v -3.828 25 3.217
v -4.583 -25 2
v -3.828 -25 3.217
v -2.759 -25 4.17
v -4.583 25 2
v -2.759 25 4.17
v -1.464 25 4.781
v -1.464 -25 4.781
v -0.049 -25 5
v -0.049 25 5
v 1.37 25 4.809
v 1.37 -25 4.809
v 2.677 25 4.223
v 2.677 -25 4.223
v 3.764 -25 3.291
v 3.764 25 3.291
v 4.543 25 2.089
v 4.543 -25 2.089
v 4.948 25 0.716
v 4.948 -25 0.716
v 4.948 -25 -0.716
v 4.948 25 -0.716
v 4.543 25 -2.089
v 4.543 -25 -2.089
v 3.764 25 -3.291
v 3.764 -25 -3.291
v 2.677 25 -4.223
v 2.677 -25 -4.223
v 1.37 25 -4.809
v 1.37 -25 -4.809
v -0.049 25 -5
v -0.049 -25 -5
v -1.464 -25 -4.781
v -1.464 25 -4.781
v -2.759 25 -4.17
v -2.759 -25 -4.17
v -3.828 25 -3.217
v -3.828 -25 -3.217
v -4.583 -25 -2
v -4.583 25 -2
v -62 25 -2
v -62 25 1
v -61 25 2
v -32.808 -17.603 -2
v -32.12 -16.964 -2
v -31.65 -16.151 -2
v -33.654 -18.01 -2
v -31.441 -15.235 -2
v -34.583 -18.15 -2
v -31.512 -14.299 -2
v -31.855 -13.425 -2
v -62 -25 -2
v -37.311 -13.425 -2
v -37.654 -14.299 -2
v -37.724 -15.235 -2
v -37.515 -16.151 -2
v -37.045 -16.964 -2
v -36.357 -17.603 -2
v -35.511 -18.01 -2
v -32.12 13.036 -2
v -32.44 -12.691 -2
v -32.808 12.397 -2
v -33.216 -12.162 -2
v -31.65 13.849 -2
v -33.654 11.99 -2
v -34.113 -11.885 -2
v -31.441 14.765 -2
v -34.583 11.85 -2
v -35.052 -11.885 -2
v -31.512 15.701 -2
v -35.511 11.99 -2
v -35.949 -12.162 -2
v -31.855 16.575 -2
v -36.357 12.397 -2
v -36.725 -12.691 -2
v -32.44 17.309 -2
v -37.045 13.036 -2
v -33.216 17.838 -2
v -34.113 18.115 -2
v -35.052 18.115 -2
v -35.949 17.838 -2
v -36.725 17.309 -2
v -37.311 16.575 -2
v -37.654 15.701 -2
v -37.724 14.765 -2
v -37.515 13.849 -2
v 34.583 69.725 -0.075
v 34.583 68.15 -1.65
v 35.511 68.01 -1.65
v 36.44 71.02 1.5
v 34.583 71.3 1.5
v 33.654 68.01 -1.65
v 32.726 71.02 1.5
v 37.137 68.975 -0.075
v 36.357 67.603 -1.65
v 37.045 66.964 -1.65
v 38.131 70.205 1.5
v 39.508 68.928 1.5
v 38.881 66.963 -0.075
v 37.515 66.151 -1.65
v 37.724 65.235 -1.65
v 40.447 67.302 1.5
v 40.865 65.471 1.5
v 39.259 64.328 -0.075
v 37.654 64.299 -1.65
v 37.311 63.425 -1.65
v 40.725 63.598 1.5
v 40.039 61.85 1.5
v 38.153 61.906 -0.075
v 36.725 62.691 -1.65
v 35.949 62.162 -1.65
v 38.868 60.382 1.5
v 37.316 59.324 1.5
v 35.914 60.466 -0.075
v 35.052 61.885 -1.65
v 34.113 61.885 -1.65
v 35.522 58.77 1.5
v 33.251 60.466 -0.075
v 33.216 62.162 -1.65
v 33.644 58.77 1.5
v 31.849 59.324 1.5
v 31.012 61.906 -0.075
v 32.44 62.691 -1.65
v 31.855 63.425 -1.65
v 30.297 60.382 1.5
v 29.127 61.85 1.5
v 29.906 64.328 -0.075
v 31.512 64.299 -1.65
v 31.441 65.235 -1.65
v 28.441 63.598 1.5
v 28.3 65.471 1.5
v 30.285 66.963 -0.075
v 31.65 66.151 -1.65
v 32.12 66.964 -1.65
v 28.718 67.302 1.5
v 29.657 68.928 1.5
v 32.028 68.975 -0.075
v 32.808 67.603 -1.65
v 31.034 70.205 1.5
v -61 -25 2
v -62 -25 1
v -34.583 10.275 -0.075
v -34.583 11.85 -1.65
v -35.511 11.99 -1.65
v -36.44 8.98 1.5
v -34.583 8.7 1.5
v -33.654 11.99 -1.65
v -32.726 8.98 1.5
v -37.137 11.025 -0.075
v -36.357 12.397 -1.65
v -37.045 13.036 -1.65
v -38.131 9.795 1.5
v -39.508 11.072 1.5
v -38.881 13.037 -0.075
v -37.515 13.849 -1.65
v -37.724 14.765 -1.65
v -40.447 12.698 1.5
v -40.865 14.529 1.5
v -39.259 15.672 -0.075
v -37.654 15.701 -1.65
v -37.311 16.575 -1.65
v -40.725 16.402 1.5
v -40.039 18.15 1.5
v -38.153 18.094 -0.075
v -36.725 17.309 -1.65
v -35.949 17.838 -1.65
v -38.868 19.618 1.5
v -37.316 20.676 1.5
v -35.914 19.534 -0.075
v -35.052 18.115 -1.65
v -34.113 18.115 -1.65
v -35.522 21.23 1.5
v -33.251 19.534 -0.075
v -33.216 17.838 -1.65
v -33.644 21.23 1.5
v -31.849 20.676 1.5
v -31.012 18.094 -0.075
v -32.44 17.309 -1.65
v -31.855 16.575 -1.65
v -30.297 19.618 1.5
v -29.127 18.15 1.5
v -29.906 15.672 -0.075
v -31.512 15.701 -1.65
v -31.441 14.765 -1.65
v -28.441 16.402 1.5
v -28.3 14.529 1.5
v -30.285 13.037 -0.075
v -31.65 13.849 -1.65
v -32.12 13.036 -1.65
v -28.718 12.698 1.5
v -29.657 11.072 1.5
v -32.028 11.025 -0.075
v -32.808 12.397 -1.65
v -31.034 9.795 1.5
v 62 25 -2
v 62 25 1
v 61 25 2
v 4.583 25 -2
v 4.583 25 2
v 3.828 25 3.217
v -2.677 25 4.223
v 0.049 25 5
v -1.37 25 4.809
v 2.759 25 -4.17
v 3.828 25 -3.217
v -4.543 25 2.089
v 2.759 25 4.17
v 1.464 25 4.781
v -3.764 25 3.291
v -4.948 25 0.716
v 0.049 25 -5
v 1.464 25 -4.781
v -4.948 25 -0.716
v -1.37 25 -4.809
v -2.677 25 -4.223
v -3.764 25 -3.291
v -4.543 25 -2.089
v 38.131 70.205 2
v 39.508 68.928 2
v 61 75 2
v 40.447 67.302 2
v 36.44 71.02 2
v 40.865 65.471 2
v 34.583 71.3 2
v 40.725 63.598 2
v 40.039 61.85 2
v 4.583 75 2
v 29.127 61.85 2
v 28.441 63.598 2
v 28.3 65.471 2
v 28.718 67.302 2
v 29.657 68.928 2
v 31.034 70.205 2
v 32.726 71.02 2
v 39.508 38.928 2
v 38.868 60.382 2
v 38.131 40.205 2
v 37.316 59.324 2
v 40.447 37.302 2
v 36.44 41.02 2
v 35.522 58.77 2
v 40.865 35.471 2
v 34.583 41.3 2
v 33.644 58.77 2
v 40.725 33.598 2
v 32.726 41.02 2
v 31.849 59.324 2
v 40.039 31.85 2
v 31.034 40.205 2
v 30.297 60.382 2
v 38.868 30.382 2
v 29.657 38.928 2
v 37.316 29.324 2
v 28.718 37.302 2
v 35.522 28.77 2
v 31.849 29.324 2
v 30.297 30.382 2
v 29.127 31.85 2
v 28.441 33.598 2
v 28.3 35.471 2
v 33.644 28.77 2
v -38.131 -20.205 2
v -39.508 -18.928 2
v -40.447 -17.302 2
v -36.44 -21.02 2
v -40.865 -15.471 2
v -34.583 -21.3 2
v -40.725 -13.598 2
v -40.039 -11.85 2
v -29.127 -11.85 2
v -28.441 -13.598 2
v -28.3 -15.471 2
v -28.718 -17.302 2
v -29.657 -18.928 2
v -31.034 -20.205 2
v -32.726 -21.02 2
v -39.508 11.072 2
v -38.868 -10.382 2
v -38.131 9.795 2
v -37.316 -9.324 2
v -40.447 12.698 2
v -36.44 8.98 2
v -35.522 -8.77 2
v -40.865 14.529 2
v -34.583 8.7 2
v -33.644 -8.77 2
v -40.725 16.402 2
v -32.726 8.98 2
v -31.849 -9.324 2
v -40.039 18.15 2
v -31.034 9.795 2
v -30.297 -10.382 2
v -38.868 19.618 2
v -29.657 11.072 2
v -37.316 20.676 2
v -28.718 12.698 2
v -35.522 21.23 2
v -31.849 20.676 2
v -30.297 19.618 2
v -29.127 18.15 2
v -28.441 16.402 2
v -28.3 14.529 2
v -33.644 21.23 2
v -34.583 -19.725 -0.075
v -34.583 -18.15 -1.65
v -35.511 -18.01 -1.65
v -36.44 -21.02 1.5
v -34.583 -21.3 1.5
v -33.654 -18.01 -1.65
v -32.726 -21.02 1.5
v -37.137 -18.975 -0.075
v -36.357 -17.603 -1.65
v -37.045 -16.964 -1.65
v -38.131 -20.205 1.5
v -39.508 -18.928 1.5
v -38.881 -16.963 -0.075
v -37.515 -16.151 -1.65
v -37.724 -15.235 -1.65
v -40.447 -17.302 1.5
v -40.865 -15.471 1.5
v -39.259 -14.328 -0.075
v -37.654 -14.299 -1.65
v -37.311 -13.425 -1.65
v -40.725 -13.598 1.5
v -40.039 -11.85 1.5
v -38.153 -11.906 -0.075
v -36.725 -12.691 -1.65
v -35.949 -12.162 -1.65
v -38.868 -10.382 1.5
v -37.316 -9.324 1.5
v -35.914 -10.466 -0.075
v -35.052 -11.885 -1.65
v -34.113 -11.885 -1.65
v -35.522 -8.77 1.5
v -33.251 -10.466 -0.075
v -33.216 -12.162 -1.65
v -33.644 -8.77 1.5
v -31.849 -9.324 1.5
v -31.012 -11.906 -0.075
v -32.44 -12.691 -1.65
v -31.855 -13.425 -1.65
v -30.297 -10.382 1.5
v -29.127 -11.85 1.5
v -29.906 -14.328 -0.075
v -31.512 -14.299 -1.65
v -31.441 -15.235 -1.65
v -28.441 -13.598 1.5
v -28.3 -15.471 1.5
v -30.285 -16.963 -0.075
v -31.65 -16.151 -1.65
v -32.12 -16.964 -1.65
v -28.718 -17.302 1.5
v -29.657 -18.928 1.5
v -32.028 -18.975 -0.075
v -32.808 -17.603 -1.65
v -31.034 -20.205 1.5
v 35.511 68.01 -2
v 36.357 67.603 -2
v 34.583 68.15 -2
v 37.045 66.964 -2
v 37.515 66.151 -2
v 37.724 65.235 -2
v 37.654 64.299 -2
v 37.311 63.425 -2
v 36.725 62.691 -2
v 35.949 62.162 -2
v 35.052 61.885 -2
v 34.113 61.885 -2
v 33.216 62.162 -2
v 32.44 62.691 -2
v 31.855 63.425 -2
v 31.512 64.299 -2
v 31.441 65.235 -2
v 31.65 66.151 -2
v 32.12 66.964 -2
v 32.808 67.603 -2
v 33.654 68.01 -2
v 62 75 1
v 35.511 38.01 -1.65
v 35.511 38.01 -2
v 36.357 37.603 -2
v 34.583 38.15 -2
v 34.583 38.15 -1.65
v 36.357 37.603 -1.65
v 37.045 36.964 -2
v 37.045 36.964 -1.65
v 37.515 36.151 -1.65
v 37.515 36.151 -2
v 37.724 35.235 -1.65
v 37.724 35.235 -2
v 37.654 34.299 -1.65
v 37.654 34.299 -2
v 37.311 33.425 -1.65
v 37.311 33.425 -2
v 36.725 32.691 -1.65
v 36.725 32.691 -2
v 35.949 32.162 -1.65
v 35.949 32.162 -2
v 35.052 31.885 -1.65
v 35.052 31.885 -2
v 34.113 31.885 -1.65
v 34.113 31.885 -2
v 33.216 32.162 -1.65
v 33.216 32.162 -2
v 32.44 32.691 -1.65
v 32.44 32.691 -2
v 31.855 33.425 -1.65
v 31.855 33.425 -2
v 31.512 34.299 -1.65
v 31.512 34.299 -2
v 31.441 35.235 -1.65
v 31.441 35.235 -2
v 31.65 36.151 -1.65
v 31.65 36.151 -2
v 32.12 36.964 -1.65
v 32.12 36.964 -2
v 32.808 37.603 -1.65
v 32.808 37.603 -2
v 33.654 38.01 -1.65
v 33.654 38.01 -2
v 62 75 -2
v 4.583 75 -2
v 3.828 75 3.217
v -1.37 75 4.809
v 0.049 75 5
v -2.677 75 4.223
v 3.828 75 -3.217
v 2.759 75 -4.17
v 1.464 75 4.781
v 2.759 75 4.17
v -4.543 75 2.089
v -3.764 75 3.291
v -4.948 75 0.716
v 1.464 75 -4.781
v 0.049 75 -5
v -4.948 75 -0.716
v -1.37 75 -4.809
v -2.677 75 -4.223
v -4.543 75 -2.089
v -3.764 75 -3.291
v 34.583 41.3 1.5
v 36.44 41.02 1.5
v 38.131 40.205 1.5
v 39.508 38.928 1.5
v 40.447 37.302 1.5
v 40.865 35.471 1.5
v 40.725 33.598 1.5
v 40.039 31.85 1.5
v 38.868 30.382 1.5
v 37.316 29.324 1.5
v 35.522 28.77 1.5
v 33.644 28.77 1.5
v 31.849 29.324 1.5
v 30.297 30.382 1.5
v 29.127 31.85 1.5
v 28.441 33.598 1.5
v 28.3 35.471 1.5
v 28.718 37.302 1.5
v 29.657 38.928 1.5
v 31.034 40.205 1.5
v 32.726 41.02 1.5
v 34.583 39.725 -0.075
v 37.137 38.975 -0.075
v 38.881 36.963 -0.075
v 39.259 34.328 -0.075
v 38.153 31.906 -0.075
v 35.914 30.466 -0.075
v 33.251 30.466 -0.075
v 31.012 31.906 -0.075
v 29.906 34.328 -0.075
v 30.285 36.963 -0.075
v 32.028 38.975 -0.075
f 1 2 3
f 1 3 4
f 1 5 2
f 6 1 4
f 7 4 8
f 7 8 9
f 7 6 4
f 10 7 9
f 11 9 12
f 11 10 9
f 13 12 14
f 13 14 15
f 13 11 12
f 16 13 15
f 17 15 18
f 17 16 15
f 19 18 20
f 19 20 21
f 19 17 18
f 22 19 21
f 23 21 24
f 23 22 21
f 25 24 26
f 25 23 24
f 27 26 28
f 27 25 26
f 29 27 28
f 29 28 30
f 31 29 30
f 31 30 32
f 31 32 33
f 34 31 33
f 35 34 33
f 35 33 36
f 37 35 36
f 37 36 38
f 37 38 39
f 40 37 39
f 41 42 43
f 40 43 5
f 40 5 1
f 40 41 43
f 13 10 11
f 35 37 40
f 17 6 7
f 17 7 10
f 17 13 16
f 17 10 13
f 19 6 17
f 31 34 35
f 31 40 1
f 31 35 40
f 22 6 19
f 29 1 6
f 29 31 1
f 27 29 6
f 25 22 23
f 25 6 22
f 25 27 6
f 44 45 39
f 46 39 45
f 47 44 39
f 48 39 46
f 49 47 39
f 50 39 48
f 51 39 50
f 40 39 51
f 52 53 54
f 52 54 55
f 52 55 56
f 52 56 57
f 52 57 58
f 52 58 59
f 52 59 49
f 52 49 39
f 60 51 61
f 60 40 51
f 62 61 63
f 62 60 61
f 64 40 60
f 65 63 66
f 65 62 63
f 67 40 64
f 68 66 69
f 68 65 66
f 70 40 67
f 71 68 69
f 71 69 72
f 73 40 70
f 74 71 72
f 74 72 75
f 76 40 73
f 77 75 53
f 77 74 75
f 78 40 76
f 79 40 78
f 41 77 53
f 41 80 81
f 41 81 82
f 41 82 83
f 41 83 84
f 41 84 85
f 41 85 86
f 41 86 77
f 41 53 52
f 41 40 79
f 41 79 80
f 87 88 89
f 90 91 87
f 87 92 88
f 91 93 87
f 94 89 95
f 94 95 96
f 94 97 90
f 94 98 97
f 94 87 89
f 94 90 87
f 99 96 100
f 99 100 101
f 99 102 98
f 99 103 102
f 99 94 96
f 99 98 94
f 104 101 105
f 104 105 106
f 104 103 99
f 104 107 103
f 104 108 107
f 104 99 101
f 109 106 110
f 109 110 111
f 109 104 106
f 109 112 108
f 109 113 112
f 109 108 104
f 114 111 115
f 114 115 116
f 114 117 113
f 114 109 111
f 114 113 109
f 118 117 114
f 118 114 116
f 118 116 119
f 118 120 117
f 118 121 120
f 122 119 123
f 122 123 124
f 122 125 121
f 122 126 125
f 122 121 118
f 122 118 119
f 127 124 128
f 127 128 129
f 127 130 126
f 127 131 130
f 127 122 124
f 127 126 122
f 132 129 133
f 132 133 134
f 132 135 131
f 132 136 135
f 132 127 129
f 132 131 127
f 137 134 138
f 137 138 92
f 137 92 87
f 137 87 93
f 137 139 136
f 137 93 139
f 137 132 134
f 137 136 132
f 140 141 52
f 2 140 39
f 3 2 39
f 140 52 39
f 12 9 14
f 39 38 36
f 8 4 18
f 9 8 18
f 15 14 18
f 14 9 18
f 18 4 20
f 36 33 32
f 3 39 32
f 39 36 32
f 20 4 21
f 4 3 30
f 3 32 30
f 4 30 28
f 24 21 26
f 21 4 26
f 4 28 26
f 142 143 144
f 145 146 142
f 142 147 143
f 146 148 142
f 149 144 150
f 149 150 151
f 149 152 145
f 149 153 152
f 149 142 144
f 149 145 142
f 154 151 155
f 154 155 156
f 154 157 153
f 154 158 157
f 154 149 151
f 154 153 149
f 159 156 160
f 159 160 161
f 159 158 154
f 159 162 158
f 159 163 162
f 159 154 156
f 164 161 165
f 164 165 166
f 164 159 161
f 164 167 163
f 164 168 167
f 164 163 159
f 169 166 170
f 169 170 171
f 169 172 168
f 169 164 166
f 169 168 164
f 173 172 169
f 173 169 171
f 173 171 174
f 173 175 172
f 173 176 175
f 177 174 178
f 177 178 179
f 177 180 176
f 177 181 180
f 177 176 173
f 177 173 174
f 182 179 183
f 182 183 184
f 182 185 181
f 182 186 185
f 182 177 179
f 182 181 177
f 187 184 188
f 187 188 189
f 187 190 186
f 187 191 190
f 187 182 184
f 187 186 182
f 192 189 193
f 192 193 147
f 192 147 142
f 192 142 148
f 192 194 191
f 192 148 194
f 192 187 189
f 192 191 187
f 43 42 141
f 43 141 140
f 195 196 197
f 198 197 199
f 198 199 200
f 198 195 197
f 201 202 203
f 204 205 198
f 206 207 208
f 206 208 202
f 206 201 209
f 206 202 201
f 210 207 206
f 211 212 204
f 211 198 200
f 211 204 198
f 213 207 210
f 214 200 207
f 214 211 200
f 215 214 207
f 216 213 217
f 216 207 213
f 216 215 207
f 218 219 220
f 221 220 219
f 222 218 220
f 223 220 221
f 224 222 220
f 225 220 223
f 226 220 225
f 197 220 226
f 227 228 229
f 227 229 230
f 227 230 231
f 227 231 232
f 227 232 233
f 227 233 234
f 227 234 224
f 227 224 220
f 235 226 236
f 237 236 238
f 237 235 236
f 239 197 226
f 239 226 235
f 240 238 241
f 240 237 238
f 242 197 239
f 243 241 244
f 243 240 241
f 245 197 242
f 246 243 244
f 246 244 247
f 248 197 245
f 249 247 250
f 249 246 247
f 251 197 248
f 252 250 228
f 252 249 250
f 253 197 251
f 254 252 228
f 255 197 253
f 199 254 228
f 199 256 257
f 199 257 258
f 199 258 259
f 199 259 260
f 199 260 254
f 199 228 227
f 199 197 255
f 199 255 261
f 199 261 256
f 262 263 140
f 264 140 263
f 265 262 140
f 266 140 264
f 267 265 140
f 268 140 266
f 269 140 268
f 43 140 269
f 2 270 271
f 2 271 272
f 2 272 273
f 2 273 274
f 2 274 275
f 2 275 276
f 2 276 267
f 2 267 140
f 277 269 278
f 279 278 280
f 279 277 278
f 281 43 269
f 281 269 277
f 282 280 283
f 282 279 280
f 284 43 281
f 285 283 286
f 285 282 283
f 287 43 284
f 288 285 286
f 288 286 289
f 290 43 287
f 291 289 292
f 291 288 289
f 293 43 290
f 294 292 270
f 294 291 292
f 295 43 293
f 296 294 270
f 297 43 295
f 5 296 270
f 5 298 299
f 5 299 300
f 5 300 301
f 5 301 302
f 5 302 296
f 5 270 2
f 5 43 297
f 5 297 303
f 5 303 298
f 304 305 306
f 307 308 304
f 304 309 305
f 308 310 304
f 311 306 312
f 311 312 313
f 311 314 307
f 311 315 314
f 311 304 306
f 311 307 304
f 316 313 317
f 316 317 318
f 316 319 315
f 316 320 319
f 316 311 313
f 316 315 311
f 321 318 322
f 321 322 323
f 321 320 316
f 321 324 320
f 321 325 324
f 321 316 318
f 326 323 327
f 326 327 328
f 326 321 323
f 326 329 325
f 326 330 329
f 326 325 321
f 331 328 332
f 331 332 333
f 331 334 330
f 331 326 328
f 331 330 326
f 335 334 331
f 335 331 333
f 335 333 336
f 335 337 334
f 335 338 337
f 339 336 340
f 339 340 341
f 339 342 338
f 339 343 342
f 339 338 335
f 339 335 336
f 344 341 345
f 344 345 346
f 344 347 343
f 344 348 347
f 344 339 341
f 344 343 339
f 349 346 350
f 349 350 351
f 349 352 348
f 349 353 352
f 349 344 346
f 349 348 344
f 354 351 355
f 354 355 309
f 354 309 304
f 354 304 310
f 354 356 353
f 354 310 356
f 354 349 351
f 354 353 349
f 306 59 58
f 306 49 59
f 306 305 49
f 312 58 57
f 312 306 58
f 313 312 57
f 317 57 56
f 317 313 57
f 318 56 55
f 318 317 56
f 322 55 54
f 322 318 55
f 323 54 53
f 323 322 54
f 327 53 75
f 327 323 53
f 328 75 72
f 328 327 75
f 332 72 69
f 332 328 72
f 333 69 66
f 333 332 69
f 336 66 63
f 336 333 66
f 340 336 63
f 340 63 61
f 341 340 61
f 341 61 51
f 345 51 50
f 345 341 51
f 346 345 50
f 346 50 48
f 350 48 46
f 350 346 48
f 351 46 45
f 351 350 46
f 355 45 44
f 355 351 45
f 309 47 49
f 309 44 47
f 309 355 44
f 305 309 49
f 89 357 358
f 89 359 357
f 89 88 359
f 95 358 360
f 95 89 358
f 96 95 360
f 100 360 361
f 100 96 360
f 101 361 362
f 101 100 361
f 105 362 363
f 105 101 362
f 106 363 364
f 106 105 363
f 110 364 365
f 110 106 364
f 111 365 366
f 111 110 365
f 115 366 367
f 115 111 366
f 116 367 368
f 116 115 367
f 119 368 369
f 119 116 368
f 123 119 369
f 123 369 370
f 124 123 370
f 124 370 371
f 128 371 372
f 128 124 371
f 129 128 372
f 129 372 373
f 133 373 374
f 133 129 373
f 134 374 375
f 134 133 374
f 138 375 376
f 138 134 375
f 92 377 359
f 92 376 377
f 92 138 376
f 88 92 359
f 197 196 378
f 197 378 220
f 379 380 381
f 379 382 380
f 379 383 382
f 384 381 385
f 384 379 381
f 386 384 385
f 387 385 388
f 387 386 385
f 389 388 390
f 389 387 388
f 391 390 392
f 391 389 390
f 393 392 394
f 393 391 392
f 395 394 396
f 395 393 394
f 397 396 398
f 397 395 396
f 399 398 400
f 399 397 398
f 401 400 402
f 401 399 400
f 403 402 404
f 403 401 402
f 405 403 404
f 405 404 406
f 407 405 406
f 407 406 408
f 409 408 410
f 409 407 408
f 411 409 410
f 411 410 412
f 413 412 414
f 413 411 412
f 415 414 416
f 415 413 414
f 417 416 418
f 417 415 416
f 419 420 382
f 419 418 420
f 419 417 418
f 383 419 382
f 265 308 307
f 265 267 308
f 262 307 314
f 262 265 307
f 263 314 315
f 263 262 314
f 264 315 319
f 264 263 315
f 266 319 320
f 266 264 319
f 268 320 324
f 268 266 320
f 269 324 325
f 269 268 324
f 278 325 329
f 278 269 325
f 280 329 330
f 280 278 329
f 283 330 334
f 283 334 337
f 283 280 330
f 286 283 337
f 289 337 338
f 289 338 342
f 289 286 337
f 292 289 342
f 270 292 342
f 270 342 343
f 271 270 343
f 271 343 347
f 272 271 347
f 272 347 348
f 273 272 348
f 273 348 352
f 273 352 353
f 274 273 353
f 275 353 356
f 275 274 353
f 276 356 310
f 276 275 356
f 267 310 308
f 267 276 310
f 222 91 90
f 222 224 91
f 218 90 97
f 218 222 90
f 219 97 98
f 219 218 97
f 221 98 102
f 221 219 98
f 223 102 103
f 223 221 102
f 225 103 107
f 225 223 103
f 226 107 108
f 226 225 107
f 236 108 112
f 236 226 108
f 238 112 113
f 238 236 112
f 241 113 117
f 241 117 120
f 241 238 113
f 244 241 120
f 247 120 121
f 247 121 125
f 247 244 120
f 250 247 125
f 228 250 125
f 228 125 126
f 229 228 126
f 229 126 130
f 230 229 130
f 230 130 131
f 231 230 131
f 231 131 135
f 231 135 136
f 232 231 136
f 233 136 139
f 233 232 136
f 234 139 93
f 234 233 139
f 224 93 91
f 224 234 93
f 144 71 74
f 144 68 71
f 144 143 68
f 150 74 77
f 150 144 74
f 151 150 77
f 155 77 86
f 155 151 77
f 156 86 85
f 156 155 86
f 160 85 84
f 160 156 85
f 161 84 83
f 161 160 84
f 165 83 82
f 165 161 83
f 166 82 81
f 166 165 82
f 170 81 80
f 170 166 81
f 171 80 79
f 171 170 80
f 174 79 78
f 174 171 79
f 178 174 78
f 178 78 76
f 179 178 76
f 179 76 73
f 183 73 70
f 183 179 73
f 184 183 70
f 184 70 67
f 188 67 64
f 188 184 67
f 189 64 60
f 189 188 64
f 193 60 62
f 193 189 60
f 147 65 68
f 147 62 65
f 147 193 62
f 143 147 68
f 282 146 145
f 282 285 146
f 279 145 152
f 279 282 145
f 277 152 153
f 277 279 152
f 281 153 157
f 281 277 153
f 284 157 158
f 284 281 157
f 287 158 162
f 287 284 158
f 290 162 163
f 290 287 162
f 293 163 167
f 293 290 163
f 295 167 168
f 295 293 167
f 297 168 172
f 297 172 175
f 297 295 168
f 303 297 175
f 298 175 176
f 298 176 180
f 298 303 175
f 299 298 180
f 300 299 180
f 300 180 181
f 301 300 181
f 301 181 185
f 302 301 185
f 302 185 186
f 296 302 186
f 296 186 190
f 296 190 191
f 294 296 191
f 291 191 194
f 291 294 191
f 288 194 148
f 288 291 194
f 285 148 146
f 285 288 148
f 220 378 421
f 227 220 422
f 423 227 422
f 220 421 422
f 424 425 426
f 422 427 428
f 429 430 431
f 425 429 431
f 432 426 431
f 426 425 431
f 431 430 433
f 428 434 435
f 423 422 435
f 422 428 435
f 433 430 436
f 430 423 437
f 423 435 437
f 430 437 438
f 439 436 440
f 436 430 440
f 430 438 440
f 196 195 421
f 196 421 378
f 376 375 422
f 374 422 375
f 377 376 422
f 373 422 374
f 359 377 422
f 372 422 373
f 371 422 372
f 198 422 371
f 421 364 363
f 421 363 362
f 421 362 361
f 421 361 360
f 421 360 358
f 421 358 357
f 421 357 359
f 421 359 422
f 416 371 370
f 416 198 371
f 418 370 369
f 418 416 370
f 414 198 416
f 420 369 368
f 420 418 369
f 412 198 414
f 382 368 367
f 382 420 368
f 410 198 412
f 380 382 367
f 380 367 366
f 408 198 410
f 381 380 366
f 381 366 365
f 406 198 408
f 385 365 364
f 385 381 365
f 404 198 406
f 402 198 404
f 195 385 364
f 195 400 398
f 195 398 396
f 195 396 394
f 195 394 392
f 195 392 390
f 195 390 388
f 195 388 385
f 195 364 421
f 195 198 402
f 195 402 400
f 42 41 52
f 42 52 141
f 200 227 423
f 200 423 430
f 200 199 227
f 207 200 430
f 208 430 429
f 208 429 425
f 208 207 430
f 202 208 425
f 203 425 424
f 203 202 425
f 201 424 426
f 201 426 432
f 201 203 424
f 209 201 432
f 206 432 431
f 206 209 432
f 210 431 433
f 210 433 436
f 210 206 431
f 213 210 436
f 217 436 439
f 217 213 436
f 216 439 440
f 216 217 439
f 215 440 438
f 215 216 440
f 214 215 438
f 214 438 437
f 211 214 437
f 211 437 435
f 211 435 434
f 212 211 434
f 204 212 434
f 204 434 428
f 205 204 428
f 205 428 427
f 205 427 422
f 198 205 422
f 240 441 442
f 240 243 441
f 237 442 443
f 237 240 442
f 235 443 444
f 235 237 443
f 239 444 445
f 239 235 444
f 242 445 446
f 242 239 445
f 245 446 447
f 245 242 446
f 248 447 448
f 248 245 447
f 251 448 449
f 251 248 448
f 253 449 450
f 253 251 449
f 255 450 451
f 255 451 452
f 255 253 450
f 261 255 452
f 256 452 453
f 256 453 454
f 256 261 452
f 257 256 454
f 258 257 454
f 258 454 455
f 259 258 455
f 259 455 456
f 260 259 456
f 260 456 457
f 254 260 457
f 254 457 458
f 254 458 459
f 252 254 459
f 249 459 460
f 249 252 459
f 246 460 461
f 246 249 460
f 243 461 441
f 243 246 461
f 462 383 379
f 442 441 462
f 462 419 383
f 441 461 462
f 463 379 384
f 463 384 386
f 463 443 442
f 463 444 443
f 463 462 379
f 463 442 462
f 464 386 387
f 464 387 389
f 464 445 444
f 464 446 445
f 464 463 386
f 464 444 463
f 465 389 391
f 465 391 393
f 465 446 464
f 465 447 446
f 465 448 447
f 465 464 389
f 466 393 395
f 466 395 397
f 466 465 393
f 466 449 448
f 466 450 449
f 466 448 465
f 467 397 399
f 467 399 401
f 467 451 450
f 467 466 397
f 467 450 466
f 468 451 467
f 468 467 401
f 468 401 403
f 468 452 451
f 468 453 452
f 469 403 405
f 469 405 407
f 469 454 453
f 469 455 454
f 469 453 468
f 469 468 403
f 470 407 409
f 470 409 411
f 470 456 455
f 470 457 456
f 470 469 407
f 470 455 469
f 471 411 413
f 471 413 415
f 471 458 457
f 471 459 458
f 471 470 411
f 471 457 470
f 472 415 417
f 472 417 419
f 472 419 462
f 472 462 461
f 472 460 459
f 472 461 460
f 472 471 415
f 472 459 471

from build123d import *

# Parameters (mm, degrees)
EXTRUDE_1_DEPTH            = 25
HOLE_WIZARD_M61_AT_2_COUNT = 2
HOLE_WIZARD_M61_AT_2_PITCH = 30
PATTERN_CIRCULAR_1_COUNT   = 2


with BuildPart() as part:
    # Эскиз1 → Бобышка-Вытянуть1 (new body, symmetric)
    with BuildSketch(Plane(origin=(0, 0, 0), x_dir=(1, 0, 0), z_dir=(0, 1, 0))):
        with BuildLine():
            Line((-4.582575695, 2), (-62, 2))
            Line((-62, 2), (-62, -1))
            Line((-62, -1), (-61, -2))
            Line((-61, -2), (-4.582575695, -2))
            ThreePointArc((-4.582575695, -2), (5, 0), (-4.582575695, 2))
        make_face()
    extrude(amount=EXTRUDE_1_DEPTH, both=True)

    # Эскиз6 → Зенковка для винта с полупотайной головкой M61 (revolve, cut)
    with BuildSketch(Plane(origin=(-34.582575695, 15, 2), x_dir=(0, -1, 0), z_dir=(1, 0, 0))):
        Polygon((0, 0), (0, 7), (3.15, 7), (3.15, 3.65), (6.3, 0.5), (6.3, 0), align=None)
    hole_wizard_m61 = revolve(axis=Axis((-34.582575695, 15, 8.35), (0, 0, -1)), mode=Mode.SUBTRACT)

    # Зенковка для винта с полупотайной головкой M61 at 2: Зенковка для винта с полупотайной головкой M61 ×2
    with Locations(*[(0, -i * HOLE_WIZARD_M61_AT_2_PITCH, 0) for i in range(1, HOLE_WIZARD_M61_AT_2_COUNT)]):
        add(hole_wizard_m61, mode=Mode.SUBTRACT)


with BuildPart() as pattern_circular_1_1:
    # Круговой массив1: pattern copy
    add(part.part.rotate(Axis((0, 25, 0), (0, 0, 1)), 1 * 360 / PATTERN_CIRCULAR_1_COUNT))


solid = Compound([part.part, pattern_circular_1_1.part])
